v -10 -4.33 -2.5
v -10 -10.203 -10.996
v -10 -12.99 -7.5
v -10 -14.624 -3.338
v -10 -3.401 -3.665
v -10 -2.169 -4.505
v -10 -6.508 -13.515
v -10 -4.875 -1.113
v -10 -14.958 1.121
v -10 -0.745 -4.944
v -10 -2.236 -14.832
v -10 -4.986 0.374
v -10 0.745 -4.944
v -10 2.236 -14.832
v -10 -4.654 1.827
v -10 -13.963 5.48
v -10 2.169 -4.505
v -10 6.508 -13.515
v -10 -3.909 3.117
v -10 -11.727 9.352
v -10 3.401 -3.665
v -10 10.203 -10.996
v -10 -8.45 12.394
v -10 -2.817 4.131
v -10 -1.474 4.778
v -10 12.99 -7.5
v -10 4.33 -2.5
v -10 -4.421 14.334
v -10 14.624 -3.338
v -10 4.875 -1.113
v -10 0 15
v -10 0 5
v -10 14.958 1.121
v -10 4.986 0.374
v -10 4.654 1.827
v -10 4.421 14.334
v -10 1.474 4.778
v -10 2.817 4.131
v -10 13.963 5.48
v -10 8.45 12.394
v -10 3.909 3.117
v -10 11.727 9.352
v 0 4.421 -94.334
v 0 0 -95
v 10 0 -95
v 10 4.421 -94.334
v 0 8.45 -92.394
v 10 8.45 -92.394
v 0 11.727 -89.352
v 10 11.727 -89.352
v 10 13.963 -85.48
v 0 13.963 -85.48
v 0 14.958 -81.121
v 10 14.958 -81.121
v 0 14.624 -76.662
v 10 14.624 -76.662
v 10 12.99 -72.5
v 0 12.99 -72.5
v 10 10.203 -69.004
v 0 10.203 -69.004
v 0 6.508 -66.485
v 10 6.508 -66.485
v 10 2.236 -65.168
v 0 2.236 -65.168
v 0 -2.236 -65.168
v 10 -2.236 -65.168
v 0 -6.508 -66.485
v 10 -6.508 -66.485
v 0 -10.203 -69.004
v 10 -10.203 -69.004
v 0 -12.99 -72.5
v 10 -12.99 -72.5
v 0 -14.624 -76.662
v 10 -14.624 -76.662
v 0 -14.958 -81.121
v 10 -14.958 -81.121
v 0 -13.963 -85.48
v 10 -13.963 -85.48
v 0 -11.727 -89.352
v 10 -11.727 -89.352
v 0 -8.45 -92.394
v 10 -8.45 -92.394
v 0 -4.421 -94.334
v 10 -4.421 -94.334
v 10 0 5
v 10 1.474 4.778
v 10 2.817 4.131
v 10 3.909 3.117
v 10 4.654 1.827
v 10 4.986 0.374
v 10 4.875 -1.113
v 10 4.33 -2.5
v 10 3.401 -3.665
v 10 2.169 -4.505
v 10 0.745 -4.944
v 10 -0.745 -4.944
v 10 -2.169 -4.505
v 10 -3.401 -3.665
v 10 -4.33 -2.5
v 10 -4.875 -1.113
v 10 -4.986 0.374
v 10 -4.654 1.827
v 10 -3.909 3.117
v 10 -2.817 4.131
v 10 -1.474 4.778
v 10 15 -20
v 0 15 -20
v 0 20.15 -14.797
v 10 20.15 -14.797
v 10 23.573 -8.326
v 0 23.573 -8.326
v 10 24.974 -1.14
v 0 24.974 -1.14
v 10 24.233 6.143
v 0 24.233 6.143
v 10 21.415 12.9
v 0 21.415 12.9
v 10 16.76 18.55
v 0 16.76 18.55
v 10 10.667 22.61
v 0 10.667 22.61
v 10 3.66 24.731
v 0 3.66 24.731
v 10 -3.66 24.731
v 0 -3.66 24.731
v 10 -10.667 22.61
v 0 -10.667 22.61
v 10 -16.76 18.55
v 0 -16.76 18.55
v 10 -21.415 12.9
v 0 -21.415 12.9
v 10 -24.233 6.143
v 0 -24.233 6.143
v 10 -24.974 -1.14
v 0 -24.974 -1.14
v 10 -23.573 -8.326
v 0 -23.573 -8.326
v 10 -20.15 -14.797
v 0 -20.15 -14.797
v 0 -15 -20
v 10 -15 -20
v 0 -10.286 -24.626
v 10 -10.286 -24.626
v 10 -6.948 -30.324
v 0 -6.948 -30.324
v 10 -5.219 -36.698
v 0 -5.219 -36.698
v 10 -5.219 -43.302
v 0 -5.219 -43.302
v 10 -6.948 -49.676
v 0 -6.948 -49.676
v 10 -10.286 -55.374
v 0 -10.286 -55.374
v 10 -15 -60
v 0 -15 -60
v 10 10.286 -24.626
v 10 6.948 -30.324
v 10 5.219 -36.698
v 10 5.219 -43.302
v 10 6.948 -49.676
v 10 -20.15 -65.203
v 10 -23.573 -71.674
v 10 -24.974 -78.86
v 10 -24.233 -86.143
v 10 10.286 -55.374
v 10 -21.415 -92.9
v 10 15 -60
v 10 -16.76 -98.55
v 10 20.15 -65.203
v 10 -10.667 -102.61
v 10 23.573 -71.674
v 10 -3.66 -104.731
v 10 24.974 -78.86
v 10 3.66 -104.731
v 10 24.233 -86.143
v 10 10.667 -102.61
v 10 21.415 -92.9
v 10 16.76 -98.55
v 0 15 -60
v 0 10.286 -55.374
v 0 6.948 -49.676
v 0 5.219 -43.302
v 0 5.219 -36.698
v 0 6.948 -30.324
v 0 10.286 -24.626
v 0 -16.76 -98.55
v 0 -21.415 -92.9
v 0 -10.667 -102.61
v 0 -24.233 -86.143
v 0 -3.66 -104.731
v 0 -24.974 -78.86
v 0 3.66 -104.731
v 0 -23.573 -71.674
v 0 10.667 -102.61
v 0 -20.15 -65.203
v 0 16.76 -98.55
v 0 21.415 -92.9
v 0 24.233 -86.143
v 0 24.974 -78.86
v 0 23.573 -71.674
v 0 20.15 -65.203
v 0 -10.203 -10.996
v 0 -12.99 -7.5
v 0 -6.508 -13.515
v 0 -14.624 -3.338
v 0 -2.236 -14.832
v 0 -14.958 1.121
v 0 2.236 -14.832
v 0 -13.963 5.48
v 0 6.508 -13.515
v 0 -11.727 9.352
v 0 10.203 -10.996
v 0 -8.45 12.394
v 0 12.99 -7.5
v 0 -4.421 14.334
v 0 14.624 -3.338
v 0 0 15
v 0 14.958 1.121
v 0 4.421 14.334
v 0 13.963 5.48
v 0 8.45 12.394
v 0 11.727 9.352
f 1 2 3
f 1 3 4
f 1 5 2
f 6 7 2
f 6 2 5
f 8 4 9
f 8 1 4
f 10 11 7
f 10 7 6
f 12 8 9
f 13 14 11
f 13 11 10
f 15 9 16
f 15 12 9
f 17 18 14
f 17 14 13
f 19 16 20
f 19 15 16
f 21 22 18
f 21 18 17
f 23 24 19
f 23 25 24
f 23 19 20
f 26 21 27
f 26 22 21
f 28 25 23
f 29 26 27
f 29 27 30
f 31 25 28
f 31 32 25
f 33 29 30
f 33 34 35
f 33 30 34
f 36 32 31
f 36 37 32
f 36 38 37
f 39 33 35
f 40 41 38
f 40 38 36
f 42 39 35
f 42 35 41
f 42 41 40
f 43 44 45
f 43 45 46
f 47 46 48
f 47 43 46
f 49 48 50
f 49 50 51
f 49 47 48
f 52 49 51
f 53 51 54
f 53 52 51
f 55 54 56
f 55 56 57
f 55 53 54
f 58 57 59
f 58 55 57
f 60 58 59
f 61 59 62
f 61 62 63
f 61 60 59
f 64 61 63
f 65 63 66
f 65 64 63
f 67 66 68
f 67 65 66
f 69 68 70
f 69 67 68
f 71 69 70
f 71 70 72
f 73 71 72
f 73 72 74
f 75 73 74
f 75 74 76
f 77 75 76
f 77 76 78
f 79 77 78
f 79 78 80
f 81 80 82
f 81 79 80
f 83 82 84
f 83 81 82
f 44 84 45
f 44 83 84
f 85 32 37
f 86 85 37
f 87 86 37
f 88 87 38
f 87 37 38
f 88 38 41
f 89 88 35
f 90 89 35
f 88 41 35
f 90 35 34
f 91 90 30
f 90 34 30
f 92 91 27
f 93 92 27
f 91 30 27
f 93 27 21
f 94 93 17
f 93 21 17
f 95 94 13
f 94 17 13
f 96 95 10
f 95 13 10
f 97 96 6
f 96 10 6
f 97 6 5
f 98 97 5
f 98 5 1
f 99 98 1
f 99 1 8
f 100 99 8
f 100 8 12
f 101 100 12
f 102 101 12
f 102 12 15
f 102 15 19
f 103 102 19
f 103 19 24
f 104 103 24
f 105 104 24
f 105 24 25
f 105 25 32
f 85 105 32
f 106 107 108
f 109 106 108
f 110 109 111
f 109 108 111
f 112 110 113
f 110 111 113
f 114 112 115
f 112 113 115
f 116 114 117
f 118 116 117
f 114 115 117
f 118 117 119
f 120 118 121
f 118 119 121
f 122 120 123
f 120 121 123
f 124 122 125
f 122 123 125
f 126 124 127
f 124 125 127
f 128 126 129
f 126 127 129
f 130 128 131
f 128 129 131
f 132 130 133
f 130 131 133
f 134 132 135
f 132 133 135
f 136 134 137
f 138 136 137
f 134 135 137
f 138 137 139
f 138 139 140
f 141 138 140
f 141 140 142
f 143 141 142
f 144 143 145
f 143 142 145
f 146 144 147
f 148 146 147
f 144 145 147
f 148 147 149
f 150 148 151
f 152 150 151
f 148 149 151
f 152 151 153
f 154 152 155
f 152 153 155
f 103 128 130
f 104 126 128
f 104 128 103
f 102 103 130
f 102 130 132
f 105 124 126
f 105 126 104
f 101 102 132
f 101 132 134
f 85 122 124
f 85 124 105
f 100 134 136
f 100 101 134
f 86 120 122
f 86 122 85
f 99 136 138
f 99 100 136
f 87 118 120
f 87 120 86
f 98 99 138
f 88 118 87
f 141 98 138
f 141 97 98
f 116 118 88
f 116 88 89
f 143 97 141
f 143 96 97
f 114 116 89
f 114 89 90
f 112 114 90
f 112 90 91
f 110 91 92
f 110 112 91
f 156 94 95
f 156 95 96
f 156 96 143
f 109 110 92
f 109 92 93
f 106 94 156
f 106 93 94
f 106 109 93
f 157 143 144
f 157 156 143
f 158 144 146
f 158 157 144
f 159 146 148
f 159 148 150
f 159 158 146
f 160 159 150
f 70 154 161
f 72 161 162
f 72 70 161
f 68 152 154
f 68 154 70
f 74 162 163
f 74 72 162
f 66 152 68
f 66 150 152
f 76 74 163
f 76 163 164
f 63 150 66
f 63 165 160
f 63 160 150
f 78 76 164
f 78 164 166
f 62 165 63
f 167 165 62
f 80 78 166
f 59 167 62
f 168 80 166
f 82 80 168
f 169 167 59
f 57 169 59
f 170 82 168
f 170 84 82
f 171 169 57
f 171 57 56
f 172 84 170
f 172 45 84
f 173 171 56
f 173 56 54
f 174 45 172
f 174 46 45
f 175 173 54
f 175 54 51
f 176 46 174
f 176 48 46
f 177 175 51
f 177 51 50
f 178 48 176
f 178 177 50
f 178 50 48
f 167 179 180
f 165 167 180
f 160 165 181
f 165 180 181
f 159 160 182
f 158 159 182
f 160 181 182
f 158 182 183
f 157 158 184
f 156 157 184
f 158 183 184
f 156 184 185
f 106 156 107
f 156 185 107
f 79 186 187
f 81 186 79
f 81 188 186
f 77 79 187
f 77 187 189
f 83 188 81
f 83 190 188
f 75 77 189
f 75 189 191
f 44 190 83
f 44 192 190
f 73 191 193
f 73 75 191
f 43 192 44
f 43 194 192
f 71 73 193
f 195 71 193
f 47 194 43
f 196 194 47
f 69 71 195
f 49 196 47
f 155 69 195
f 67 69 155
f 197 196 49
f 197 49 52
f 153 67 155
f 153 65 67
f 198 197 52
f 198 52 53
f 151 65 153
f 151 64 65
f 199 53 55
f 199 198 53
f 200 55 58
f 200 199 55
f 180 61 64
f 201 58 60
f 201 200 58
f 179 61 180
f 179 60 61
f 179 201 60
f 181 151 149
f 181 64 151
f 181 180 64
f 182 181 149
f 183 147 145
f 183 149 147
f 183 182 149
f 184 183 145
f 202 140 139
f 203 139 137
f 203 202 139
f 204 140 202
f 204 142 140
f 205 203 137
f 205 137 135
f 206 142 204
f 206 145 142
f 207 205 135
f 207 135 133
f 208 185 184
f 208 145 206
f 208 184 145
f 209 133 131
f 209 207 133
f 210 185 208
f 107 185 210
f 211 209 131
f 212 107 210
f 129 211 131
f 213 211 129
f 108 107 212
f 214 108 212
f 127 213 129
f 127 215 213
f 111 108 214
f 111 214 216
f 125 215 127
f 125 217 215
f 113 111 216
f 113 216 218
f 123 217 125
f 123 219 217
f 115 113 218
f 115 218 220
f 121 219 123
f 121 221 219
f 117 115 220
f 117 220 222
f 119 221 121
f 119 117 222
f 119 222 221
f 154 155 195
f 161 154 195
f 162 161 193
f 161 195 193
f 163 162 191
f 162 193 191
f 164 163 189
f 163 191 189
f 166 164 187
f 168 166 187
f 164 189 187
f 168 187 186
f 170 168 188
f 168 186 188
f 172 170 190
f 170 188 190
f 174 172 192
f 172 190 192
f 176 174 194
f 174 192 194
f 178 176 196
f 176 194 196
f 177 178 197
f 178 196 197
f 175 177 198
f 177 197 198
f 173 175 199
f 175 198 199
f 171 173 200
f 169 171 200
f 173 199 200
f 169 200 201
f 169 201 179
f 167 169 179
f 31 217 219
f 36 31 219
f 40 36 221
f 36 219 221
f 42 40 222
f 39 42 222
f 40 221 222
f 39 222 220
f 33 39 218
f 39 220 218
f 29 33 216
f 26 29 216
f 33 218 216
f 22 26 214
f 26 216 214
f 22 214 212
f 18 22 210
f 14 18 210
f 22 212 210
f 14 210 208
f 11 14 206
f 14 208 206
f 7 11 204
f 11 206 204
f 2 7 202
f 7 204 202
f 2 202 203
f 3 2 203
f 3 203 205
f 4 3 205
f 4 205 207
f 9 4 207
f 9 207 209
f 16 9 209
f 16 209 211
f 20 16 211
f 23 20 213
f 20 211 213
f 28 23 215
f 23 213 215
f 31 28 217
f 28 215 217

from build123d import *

# Parameters (mm, degrees)
SKETCH1_R           = 15
BOSS_EXTRUDE1_DEPTH = 10
SKETCH2_R           = 15
BOSS_EXTRUDE2_DEPTH = 10
SKETCH3_R           = 15
BOSS_EXTRUDE3_DEPTH = 10
SKETCH4_R           = 5
CUT_EXTRUDE1_DEPTH  = 36


with BuildPart() as part:
    # Sketch1 → Boss-Extrude1 (new body)
    with BuildSketch(Plane(origin=(0, 0, 0), x_dir=(0, 0, -1), z_dir=(1, 0, 0))):
        with BuildLine():
            ThreePointArc((20, 15), (-25, 0), (20, -15))
            ThreePointArc((20, -15), (40, -5), (60, -15))
            ThreePointArc((60, -15), (105, 0), (60, 15))
            ThreePointArc((60, 15), (40, 5), (20, 15))
        make_face()
        Circle(SKETCH1_R, mode=Mode.SUBTRACT)
        with Locations((80, 0)):
            Circle(SKETCH1_R, mode=Mode.SUBTRACT)
    extrude(amount=BOSS_EXTRUDE1_DEPTH)

    # Sketch2 → Boss-Extrude2 (add)
    with BuildSketch(Plane.ZY):
        Circle(SKETCH2_R)
    extrude(amount=-BOSS_EXTRUDE2_DEPTH)

    # Sketch3 → Boss-Extrude3 (add)
    with BuildSketch(Plane.ZY):
        Circle(SKETCH3_R)
    extrude(amount=BOSS_EXTRUDE3_DEPTH)

    # Sketch4 → Cut-Extrude1 (cut)
    with BuildSketch(Plane.ZY.offset(10)):
        Circle(SKETCH4_R)
    extrude(amount=-CUT_EXTRUDE1_DEPTH, mode=Mode.SUBTRACT)


solid = part.part
